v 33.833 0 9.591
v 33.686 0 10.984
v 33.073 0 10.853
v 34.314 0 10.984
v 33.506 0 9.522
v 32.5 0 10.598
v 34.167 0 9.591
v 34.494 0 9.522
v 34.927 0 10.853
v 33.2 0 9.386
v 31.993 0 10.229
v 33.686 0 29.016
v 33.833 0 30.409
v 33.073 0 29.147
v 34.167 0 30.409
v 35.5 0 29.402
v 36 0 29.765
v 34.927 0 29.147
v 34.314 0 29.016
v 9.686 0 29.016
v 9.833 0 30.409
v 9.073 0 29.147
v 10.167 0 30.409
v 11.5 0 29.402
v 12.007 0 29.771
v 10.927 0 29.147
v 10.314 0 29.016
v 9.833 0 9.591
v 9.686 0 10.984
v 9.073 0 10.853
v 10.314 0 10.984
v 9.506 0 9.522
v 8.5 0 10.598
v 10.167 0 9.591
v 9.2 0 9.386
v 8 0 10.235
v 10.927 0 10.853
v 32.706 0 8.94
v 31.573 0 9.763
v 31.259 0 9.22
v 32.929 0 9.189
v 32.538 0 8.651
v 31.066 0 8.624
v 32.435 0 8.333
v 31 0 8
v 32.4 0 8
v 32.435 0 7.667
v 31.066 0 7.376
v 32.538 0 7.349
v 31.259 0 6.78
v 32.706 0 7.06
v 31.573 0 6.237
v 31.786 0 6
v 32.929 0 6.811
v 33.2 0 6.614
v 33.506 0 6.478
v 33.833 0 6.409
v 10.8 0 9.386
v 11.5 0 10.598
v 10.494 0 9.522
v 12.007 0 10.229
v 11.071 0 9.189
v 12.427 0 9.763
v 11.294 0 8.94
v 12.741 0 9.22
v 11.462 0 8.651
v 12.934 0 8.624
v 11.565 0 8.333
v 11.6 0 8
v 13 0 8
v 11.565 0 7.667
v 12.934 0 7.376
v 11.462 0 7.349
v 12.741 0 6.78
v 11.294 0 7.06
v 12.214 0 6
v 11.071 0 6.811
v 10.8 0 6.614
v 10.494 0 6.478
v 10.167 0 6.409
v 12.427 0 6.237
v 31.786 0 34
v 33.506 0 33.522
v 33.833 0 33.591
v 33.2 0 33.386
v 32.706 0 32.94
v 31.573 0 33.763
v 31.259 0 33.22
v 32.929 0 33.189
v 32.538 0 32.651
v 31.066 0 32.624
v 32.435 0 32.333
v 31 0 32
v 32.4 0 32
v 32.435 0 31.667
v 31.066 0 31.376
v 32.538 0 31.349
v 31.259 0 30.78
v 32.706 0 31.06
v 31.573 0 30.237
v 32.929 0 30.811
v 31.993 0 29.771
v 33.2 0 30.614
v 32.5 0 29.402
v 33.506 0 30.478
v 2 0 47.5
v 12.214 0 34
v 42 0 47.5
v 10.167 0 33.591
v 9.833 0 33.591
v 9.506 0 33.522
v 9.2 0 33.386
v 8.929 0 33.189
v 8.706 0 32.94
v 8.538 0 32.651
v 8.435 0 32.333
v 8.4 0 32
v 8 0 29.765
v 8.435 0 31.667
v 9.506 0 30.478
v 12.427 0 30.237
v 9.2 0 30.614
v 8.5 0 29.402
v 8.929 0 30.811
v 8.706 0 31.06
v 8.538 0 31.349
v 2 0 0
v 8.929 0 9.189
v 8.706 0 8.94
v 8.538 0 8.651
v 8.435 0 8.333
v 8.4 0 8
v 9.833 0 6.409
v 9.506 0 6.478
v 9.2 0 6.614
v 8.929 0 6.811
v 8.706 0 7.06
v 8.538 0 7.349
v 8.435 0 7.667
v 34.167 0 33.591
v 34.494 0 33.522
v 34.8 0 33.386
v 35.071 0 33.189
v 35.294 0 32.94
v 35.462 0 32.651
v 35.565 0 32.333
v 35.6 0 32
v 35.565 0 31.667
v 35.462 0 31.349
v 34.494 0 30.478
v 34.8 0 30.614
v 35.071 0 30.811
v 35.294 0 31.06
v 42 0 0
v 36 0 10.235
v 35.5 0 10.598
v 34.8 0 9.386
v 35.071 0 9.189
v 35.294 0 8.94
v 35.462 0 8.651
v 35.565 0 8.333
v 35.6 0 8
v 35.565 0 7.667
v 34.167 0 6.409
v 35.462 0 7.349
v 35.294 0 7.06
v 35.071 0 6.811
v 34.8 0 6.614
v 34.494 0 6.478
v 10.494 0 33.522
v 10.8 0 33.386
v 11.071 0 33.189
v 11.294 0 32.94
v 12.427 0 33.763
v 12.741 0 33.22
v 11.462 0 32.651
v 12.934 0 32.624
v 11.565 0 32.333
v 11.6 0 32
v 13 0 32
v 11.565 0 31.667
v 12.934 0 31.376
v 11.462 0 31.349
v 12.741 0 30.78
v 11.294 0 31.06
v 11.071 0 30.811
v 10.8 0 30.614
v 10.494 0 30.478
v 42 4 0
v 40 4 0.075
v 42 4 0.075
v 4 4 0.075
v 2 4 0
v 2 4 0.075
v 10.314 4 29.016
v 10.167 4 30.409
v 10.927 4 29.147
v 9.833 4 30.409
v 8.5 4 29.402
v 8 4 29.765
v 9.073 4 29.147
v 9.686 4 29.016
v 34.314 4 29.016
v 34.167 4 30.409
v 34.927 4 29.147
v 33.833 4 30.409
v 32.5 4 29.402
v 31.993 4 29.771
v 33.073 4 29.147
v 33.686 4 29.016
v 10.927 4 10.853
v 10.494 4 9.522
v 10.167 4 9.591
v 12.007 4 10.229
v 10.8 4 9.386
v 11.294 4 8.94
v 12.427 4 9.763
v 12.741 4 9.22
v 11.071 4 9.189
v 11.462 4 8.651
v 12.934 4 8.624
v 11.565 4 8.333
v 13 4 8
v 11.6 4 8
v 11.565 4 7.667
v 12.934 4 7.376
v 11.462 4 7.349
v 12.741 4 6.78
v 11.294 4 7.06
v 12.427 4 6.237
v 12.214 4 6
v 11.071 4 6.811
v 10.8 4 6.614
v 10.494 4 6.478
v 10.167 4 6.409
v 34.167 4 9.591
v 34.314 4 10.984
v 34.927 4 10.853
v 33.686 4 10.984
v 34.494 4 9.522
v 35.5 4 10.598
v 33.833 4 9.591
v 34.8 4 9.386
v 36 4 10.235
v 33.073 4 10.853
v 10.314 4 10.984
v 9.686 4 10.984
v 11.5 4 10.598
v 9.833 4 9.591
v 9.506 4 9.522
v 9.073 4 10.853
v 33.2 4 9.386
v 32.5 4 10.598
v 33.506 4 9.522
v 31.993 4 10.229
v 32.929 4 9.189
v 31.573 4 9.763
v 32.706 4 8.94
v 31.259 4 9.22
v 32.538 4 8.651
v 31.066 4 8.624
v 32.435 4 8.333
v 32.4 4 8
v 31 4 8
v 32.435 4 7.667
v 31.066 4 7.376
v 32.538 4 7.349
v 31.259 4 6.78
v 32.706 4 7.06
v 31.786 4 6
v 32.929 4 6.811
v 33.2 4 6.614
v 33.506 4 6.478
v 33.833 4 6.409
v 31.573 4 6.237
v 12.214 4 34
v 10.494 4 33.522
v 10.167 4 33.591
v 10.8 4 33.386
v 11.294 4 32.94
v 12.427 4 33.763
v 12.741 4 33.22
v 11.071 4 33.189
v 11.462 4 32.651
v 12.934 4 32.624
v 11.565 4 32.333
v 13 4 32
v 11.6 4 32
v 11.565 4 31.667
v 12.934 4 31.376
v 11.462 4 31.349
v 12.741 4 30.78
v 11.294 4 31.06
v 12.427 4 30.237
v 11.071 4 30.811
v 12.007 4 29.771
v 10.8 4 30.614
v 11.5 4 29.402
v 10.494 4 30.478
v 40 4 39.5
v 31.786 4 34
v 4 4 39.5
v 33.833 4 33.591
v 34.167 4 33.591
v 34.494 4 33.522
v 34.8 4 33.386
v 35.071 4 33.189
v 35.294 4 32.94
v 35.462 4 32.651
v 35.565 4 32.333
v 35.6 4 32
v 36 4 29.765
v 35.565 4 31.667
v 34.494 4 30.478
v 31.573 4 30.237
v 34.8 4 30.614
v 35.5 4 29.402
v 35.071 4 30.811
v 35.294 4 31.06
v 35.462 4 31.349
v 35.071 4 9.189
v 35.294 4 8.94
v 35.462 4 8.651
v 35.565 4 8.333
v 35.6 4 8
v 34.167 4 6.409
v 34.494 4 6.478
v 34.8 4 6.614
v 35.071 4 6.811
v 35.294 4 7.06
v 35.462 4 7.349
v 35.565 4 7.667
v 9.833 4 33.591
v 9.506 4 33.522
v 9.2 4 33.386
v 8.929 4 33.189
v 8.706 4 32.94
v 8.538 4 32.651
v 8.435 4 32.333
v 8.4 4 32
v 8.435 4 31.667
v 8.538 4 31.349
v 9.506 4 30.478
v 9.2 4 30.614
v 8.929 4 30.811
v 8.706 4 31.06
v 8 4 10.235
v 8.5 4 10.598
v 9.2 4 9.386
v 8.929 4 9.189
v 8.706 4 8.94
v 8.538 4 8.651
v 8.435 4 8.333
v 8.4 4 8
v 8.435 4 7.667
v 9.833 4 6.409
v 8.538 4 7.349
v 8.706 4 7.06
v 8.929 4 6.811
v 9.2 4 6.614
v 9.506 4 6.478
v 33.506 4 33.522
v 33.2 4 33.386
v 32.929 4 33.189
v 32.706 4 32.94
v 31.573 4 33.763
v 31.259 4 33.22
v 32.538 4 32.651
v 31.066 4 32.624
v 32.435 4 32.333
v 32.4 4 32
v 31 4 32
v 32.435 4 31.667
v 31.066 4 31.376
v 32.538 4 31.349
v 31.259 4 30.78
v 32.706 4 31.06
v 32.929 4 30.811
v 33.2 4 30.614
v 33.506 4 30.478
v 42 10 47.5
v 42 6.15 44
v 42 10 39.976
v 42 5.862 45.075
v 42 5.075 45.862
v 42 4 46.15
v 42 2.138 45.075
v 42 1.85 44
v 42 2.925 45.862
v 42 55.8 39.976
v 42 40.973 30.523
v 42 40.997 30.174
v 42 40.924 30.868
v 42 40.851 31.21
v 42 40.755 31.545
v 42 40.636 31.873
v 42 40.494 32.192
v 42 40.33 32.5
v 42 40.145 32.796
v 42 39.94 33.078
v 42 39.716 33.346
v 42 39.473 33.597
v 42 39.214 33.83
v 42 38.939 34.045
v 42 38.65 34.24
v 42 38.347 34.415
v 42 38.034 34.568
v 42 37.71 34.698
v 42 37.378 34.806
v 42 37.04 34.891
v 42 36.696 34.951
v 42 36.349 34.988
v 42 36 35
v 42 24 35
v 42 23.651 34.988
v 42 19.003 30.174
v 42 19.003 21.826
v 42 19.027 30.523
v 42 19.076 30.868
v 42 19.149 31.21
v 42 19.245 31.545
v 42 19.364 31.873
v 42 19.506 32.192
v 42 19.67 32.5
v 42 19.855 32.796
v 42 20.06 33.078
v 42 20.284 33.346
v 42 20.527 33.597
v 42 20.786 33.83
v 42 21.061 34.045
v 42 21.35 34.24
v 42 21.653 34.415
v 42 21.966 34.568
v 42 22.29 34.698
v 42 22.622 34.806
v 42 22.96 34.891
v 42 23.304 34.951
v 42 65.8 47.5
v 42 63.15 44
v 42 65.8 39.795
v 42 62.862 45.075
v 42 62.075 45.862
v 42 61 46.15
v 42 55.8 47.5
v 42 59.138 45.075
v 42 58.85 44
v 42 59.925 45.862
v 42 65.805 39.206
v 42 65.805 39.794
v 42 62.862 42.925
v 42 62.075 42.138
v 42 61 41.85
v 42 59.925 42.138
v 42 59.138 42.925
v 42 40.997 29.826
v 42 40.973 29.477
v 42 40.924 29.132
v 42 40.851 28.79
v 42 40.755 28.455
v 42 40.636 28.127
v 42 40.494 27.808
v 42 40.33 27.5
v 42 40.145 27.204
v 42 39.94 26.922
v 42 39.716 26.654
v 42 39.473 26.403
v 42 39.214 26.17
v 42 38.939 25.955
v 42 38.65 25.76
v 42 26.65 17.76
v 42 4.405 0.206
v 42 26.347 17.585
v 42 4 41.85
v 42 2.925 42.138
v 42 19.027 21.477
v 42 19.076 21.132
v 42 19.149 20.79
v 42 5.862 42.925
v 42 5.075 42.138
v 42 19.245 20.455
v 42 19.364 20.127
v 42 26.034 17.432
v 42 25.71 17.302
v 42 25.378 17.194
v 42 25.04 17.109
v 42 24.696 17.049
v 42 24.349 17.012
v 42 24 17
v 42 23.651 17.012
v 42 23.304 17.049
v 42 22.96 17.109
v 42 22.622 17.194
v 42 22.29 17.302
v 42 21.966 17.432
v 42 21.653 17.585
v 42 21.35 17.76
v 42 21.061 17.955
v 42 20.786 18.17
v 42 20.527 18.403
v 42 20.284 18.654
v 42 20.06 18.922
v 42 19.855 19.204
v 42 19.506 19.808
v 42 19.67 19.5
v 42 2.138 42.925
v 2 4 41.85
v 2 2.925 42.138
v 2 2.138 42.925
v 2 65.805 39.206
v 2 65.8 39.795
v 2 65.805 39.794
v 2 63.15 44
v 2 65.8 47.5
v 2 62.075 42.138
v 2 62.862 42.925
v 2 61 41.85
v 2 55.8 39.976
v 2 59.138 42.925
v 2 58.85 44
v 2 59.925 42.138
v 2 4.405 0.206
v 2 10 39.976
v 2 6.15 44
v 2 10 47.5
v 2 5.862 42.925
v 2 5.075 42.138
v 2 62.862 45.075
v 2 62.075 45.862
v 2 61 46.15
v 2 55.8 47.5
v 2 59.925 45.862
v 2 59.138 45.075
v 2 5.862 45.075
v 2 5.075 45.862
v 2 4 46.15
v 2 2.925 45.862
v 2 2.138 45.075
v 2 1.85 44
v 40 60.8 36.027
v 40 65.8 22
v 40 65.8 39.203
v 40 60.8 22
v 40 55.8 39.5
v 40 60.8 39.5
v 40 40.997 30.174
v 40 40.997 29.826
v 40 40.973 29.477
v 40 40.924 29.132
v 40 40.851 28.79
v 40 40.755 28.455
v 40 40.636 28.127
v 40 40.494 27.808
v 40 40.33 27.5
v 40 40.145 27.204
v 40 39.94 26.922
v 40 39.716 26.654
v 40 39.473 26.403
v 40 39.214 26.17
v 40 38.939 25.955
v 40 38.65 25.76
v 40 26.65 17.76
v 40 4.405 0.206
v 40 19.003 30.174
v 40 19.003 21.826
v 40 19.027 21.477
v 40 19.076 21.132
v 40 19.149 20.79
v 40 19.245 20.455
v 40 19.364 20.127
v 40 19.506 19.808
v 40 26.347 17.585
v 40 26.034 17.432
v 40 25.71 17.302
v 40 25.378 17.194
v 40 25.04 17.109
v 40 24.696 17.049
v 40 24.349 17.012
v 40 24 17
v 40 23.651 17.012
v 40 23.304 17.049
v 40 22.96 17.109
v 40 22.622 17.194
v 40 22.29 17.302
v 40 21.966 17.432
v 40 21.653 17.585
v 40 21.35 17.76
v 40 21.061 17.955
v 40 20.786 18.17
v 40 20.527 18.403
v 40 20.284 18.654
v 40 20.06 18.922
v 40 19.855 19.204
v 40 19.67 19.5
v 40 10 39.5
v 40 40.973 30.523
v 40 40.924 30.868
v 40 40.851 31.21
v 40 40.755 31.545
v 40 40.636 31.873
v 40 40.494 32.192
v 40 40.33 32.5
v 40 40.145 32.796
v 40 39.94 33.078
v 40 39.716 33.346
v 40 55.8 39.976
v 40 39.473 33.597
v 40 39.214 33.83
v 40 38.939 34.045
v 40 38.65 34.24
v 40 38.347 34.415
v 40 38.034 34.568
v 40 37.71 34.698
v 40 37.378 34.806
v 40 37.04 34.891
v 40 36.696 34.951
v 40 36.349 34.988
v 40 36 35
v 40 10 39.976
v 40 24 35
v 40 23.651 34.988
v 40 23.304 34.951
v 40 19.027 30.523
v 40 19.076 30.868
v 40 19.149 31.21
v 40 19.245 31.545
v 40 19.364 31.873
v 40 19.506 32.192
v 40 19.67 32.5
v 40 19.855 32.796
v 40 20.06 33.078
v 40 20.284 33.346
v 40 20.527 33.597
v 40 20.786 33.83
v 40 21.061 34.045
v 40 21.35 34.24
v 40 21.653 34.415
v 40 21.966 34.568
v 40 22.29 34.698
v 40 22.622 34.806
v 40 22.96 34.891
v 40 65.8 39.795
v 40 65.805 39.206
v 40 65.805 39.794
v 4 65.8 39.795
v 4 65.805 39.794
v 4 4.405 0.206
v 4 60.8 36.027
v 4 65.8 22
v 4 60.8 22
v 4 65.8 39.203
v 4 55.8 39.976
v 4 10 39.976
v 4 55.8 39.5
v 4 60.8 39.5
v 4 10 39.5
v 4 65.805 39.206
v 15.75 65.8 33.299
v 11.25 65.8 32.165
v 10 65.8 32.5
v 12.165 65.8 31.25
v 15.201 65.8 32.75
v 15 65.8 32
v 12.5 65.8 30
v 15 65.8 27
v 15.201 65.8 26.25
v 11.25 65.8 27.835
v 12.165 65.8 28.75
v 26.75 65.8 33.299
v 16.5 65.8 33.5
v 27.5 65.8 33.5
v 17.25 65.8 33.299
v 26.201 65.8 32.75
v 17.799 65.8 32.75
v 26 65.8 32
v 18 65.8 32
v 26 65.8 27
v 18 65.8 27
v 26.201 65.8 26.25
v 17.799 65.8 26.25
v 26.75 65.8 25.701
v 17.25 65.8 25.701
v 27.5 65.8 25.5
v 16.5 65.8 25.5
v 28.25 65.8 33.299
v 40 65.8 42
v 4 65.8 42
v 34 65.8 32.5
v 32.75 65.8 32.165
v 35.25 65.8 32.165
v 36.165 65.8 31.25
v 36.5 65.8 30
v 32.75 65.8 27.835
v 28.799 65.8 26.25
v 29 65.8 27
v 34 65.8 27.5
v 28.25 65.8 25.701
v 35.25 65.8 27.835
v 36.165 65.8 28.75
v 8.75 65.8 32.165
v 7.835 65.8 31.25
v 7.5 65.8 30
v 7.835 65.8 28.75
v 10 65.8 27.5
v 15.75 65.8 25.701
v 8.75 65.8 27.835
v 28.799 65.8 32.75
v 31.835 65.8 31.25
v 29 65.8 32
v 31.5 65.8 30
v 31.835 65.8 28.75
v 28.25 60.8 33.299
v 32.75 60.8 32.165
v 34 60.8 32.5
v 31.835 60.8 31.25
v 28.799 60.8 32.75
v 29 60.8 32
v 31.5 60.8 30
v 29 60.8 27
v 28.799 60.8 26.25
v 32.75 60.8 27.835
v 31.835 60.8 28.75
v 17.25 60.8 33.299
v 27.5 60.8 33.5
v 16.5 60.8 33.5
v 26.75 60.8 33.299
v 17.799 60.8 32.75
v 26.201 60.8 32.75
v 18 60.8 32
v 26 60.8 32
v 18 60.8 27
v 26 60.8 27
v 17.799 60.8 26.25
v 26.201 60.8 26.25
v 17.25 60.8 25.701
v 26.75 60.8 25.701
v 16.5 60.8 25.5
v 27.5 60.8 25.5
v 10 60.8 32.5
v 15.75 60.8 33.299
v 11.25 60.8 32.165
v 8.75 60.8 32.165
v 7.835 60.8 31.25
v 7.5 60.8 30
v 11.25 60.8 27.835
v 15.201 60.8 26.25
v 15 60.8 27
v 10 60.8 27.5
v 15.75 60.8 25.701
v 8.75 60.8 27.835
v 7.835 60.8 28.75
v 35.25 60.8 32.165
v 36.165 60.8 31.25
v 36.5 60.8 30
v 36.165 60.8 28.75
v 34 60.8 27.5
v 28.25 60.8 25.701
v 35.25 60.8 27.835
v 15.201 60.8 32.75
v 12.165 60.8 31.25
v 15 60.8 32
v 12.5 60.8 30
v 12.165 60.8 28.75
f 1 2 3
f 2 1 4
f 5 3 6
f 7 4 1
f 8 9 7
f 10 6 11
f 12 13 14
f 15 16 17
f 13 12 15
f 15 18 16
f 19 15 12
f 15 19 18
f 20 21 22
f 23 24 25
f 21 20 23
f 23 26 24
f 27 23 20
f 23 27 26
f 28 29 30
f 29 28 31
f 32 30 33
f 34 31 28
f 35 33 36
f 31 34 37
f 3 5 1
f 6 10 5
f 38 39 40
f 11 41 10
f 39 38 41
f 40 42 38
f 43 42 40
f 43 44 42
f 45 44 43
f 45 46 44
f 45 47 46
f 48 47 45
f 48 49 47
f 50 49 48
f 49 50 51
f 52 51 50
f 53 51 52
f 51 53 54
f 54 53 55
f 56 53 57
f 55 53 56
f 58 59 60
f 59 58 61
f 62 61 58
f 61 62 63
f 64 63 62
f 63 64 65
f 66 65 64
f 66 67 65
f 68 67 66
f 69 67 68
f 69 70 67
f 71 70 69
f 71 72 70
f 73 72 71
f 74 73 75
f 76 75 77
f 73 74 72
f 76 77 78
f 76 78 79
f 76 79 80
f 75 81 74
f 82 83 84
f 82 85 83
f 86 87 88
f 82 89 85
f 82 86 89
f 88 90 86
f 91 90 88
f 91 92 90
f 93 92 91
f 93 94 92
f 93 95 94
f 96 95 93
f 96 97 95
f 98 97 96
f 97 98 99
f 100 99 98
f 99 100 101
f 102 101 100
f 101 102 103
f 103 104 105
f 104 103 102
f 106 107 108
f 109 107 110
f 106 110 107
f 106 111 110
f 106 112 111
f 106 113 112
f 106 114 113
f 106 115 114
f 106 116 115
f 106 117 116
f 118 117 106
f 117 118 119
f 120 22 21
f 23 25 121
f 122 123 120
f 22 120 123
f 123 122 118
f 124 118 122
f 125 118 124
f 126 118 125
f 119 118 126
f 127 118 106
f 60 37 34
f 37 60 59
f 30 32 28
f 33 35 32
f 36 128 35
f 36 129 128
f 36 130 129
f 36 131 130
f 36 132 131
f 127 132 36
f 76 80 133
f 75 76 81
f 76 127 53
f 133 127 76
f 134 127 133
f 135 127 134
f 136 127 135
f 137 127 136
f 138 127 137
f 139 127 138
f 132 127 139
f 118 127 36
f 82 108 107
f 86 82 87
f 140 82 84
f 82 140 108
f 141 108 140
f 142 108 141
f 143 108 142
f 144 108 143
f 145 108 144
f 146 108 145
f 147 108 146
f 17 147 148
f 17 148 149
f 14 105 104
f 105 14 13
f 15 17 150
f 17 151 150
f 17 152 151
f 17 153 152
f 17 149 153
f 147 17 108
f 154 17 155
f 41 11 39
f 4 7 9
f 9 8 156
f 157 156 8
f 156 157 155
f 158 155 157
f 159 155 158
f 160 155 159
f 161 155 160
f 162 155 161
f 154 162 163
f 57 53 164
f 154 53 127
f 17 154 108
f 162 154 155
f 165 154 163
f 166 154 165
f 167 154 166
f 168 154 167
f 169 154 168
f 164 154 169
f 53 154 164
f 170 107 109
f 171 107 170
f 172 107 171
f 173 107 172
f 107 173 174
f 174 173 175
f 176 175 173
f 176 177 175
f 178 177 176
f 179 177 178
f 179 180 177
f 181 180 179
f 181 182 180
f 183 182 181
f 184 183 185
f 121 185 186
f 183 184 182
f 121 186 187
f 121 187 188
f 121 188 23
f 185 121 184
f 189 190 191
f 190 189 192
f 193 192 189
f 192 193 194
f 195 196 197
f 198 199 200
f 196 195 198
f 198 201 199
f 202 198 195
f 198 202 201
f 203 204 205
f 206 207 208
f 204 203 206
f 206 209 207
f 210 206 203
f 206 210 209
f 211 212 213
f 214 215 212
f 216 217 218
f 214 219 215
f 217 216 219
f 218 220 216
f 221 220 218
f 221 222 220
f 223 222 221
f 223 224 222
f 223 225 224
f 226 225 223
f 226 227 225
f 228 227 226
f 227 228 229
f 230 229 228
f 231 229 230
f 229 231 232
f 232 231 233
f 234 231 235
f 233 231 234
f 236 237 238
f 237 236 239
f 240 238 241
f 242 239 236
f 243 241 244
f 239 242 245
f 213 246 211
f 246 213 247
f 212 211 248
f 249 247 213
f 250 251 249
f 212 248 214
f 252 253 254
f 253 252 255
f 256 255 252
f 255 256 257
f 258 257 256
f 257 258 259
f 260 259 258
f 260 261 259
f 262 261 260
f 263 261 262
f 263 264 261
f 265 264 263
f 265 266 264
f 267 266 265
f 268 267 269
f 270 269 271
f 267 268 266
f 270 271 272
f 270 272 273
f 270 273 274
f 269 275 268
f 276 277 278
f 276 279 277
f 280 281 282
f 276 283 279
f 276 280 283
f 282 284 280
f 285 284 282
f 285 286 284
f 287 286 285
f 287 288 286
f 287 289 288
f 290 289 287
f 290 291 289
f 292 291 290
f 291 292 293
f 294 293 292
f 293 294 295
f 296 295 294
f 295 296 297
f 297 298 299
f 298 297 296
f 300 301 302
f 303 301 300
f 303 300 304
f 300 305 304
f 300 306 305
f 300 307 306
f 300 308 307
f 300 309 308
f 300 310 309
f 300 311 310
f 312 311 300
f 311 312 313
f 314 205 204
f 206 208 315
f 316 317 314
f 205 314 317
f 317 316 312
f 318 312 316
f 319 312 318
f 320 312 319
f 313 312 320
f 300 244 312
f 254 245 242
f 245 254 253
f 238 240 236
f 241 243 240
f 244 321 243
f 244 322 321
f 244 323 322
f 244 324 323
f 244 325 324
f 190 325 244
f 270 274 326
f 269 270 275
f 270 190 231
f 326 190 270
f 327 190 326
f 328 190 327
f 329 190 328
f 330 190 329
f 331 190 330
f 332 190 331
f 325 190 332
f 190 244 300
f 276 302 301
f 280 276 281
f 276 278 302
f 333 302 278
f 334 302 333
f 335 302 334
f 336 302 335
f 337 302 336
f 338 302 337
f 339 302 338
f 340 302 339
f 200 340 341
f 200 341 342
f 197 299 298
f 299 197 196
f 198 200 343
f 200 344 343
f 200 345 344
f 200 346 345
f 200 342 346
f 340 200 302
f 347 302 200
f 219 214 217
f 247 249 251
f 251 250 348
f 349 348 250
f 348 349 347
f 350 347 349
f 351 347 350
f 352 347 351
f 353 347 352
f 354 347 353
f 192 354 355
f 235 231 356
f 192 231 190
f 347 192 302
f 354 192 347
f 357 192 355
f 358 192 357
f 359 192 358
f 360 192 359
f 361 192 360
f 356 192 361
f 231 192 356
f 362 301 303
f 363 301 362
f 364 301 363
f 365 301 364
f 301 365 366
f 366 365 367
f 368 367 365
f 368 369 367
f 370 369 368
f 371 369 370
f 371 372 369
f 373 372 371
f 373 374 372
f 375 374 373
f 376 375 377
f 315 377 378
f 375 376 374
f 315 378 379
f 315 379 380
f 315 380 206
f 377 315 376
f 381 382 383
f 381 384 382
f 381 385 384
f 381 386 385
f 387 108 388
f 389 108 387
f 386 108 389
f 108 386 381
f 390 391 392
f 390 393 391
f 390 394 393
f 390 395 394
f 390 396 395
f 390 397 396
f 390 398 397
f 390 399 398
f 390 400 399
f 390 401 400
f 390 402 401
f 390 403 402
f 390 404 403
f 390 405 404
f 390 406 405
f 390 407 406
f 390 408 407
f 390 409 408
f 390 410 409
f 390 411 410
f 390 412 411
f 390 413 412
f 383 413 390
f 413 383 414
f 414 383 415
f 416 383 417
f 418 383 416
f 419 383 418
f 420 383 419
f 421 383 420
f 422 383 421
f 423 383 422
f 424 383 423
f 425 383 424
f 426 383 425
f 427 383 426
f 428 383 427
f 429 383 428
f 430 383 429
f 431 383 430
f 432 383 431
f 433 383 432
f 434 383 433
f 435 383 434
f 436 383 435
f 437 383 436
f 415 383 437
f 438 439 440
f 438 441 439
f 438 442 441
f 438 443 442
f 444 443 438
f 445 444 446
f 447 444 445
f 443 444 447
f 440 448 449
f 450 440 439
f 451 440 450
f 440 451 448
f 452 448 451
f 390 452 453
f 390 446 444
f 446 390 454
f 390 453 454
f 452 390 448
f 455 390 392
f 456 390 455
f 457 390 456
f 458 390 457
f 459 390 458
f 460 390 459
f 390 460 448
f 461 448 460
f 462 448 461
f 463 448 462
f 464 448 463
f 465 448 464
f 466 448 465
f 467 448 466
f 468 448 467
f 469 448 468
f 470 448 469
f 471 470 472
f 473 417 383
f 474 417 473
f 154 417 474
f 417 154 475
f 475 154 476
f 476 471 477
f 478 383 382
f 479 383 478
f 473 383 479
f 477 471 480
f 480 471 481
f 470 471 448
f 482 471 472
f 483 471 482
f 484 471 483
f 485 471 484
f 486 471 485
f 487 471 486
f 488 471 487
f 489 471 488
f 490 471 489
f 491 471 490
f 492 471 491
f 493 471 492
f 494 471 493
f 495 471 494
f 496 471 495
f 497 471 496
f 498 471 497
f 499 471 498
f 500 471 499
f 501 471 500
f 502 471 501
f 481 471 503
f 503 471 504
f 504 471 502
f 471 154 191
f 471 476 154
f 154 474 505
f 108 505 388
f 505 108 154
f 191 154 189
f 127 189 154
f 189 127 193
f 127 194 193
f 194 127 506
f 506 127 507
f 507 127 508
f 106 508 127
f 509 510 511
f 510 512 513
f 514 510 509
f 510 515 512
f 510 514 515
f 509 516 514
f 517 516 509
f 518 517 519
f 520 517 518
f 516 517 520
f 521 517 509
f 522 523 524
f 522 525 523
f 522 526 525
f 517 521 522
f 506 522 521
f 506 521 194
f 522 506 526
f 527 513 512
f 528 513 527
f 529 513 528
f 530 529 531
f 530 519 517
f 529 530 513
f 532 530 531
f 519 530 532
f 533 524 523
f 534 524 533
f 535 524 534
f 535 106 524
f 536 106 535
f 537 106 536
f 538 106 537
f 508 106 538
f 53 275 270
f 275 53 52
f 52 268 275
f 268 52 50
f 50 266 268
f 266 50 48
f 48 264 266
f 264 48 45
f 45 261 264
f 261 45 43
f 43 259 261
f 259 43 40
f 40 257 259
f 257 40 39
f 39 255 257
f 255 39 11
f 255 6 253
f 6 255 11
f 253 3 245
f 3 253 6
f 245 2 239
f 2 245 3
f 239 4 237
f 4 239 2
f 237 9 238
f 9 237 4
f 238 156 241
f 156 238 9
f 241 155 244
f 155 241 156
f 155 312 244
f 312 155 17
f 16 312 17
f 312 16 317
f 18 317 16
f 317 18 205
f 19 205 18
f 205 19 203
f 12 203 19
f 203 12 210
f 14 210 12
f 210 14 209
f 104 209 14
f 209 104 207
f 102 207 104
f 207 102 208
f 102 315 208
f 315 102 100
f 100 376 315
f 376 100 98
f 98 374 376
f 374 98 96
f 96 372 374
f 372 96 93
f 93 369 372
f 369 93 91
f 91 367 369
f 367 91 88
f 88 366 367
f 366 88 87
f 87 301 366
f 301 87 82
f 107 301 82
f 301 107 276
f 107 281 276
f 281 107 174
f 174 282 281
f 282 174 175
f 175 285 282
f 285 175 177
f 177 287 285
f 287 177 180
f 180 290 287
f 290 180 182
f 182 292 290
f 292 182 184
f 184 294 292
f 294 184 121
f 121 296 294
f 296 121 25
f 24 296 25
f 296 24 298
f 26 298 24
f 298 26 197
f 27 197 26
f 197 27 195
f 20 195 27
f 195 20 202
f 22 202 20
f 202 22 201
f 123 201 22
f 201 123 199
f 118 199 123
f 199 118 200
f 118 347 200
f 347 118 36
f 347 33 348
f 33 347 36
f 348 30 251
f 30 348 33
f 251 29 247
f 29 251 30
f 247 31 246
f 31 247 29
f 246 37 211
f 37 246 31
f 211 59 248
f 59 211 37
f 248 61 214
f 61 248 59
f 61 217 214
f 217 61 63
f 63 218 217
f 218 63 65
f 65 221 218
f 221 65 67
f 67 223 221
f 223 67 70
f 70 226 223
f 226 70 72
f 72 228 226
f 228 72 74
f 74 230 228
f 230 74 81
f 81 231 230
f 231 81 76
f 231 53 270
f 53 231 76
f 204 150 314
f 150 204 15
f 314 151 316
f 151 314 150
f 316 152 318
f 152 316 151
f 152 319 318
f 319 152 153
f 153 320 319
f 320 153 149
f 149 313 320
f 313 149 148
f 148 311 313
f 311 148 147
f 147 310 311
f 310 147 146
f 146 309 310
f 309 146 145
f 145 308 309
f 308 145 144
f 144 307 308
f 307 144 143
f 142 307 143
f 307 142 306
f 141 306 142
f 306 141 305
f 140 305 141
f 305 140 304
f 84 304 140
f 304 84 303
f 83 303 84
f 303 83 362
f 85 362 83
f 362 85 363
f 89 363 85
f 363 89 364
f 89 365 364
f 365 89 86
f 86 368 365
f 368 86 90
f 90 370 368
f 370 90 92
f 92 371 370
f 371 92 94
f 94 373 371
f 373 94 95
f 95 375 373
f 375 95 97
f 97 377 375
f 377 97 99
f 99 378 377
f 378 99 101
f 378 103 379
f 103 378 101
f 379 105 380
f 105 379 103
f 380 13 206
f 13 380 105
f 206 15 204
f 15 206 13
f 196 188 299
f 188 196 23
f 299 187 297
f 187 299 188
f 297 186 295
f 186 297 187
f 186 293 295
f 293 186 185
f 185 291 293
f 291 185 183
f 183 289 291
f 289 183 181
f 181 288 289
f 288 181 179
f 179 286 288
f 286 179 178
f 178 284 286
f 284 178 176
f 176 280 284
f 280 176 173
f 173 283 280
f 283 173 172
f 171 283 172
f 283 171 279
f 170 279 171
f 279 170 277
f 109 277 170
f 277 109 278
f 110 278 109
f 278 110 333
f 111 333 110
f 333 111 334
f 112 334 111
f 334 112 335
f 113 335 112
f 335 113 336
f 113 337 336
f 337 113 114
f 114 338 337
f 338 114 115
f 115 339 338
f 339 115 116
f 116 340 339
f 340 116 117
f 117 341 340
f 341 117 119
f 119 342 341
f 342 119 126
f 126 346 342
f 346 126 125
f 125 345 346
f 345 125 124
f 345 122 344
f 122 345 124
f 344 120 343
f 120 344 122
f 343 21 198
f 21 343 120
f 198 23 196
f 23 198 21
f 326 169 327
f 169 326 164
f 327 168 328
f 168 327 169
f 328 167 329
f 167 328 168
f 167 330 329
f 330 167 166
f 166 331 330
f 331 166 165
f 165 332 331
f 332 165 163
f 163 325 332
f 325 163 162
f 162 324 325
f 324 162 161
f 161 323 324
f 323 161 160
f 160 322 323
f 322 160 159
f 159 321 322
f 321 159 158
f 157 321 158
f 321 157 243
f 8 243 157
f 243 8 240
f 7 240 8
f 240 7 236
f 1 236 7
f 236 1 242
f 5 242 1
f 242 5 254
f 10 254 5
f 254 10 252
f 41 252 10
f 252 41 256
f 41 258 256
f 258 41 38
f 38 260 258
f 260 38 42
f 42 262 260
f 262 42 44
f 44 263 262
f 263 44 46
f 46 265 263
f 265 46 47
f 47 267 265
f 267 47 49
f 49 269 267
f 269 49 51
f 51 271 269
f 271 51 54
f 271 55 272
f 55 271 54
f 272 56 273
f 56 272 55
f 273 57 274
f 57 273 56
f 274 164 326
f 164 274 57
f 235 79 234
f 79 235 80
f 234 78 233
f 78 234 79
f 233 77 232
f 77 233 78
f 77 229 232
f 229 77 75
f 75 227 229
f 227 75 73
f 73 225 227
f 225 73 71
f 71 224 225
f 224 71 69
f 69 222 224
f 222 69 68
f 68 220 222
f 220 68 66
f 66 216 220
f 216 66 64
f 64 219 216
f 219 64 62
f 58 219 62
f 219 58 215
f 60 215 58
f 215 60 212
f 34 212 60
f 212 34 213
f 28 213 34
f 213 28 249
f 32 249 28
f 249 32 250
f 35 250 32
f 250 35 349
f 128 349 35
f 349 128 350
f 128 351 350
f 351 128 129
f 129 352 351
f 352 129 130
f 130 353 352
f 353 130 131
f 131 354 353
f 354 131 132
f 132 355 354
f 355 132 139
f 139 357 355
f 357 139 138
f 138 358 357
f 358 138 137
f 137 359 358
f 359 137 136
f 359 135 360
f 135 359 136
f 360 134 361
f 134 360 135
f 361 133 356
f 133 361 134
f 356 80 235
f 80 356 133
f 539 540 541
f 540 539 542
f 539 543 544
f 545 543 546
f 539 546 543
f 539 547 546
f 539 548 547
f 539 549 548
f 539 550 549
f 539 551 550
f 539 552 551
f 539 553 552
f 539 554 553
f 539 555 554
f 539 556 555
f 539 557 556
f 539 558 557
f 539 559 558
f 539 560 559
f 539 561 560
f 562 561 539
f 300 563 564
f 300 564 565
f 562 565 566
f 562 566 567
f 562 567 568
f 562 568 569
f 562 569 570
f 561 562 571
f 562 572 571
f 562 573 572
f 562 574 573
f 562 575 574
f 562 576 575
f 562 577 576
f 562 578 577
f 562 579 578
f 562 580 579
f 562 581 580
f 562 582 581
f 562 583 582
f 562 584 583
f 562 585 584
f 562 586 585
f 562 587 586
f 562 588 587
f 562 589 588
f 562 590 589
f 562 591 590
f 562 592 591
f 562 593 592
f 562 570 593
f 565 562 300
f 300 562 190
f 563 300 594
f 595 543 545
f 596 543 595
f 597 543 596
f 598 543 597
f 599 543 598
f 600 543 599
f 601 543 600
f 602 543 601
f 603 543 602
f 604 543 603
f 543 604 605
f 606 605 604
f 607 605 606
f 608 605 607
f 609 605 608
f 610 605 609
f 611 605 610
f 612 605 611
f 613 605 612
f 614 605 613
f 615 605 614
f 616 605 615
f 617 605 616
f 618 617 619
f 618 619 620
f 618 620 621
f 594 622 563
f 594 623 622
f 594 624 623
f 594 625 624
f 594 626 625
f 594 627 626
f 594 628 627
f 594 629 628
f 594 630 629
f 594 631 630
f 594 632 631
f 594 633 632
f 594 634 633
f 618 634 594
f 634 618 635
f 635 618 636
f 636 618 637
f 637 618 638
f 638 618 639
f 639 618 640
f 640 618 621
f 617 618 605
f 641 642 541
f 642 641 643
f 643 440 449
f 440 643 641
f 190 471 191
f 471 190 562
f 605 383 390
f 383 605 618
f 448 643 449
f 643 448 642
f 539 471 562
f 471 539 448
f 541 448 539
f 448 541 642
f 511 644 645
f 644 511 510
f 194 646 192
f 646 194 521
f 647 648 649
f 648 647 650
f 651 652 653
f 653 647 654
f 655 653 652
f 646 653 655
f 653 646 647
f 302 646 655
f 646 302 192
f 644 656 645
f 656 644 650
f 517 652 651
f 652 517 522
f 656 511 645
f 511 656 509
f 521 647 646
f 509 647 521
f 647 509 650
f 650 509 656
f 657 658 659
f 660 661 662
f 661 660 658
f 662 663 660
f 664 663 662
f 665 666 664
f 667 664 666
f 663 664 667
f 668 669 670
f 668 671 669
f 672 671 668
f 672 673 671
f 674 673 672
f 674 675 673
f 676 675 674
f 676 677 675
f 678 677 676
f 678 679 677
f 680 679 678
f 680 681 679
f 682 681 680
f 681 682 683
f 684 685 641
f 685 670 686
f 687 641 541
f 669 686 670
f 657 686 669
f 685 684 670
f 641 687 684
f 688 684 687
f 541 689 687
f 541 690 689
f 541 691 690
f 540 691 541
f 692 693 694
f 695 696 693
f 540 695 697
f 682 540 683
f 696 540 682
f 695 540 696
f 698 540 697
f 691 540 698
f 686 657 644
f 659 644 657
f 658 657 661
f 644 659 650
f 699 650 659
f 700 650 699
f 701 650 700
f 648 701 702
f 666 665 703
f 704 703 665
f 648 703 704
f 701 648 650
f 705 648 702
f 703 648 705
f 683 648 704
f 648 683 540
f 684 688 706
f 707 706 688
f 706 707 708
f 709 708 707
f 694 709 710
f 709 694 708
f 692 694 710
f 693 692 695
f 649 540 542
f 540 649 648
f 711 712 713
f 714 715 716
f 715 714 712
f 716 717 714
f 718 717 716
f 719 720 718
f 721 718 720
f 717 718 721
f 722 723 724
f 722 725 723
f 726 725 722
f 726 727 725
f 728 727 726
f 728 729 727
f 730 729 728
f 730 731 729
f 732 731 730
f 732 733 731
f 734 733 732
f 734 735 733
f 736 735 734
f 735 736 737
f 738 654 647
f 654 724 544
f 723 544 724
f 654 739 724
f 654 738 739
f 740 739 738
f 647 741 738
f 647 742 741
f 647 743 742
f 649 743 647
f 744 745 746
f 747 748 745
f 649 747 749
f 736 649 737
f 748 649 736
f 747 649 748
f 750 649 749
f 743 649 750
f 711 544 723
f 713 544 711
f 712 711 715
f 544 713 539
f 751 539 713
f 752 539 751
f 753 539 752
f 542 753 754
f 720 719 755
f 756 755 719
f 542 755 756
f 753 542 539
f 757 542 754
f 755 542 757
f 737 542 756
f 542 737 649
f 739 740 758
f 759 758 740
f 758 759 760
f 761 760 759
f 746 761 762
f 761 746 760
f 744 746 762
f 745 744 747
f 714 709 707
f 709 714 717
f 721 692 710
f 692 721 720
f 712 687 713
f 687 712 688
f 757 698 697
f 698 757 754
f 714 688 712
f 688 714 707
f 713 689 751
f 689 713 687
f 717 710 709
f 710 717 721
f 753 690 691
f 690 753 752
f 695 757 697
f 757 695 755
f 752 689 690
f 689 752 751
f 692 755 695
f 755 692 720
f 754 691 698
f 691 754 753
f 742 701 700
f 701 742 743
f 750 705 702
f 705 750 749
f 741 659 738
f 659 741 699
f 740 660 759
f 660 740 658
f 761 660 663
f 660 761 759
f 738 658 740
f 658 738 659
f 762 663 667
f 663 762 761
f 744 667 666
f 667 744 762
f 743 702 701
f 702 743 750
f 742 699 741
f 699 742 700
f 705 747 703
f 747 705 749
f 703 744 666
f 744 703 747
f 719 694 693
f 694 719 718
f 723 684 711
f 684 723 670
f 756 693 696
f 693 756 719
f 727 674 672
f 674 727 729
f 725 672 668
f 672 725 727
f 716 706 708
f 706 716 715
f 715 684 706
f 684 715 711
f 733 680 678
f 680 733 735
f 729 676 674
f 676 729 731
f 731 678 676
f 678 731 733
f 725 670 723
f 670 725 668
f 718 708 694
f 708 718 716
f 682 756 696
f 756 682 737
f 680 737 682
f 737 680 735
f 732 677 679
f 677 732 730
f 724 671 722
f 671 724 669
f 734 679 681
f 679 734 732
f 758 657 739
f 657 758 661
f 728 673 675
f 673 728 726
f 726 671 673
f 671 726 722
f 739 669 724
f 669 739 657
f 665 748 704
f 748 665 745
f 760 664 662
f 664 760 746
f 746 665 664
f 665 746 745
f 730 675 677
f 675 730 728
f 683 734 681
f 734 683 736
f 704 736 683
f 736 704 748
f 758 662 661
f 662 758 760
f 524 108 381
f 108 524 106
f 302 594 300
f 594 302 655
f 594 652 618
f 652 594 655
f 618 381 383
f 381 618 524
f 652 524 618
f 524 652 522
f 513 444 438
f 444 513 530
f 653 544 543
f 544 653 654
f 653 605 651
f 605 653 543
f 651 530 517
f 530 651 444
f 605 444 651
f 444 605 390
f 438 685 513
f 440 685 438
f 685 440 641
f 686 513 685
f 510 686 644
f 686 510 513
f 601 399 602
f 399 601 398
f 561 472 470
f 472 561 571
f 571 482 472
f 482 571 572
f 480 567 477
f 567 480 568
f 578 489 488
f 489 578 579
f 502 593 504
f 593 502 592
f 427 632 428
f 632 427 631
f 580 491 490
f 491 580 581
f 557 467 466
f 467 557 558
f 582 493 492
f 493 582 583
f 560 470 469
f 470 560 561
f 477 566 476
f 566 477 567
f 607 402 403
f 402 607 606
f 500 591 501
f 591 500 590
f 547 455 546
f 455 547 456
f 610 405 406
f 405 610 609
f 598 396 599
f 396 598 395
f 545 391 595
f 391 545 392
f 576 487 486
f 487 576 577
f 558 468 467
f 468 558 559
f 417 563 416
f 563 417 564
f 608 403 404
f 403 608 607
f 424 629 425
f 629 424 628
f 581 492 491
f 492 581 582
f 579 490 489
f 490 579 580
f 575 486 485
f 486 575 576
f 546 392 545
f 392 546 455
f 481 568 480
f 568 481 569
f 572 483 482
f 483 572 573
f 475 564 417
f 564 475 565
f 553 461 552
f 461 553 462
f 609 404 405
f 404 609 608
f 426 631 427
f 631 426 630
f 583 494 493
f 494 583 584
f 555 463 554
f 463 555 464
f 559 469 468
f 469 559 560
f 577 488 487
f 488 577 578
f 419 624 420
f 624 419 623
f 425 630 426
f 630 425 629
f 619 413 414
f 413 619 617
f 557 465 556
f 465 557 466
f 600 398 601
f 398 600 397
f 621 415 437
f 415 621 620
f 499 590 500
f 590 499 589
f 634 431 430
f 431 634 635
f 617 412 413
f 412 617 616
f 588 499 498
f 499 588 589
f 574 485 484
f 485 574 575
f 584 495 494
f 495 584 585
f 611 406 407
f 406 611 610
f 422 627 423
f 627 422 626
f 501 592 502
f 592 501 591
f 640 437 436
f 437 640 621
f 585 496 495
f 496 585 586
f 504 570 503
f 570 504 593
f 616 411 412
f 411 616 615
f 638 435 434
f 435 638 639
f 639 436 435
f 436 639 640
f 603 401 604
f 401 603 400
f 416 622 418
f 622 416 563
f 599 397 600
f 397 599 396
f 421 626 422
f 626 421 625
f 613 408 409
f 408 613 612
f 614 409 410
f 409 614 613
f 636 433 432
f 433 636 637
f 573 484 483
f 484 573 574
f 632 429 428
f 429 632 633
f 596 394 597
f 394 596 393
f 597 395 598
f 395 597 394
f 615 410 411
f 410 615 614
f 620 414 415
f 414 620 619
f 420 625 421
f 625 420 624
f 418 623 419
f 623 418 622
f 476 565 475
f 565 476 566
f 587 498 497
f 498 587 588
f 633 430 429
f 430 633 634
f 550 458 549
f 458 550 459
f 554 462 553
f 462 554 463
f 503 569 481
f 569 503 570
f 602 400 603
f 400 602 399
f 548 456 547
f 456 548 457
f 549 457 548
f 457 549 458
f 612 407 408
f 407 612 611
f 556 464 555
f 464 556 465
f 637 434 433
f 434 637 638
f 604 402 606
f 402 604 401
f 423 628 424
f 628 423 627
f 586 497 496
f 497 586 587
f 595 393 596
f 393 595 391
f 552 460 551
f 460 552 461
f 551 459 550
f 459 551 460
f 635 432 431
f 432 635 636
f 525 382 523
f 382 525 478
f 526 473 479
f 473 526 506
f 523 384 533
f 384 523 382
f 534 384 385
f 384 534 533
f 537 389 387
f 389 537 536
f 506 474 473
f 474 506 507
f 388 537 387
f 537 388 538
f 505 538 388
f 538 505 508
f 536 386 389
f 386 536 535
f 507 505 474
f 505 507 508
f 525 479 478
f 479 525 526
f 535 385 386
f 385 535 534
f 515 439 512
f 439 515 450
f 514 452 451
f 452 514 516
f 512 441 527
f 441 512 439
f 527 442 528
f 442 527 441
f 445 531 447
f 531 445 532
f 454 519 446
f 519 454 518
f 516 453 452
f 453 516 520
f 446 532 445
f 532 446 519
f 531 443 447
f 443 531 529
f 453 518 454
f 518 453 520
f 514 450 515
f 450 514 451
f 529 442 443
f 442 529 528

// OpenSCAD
module keepers() {
difference() {
    translate([0,0,0]) circle(d=6, $fn=30);
    translate([0,0,0]) circle(d=3.2, $fn=30);
    }
}
module fan() {
difference() {
    translate([0,0,0]) square([40,40]);
    translate([6,6,0]) square([28,28]);
    }
}
module openframe() {
    linear_extrude(4) {
            union() {
            translate([0,0,0]) fan();
            translate([8,8,0]) keepers();
            translate([8,32,0]) keepers();
            translate([32,8,0]) keepers();
            translate([32,32,0]) keepers();
            }
    }
}
module sidesupport() {
        linear_extrude(2) { hull() {
        translate([-61.4,39]) circle(d=1);
        translate([0,39]) circle(d=1);
        translate([0,0]) circle(d=1);
        }
    }
}
module invertedframe() {
    rotate([90,0,0]) {
            union() {   
                translate([0,0,0]) openframe();
                translate([0,0.5,4]) rotate([0,90,0]) sidesupport();
                translate([38,0.5,4]) rotate([0,90,0]) sidesupport();
        }
    }
}
module probemount() { difference() {
    translate([9,0,0]) rotate([90,270,0]) cube([20,36,5]);
    translate([-21,0,8]) rotate([90,0,0]) cylinder(h=5, d=5, $fn=12);
    translate([3,0,8]) rotate([90,0,0]) cylinder(h=5, d=5, $fn=12);
    hull() {
            translate([-14.5,0,10]) rotate([90,0,0]) cylinder(h=5, d=3, $fn=12);
            translate([-14.5,0,5]) rotate([90,0,0]) cylinder(h=5, d=3, $fn=12);
            }   
    hull() {
            translate([-3.5,0,10]) rotate([90,0,0]) cylinder(h=5, d=3, $fn=12);
            translate([-3.5,0,5]) rotate([90,0,0]) cylinder(h=5, d=3, $fn=12);
            }
    }
}
module unit() {
    union () {
                invertedframe();
                translate([0,-10,39.5]) cube([40,10,8]);
                translate([0,-65.8,39.5]) cube([40,10,8]);
                translate([29,-60.8,22]) probemount();
    }
}
difference() {
    translate([42,0,0]) rotate([0,0,180]) unit();
    hull() {
            translate([40,24,22]) rotate([0,90,0]) cylinder(h=4, d=10, $fn=90);
            translate([40,36,30]) rotate([0,90,0]) cylinder(h=4, d=10, $fn=90);
            translate([40,24,30]) rotate([0,90,0]) cylinder(h=4, d=10, $fn=90);
            }
    translate([0,4,44]) rotate([0,90,0]) cylinder(h=44, d=4.3, $fn=12);
    translate([0,61,44]) rotate([0,90,0]) cylinder(h=44, d=4.3, $fn=12);
}
